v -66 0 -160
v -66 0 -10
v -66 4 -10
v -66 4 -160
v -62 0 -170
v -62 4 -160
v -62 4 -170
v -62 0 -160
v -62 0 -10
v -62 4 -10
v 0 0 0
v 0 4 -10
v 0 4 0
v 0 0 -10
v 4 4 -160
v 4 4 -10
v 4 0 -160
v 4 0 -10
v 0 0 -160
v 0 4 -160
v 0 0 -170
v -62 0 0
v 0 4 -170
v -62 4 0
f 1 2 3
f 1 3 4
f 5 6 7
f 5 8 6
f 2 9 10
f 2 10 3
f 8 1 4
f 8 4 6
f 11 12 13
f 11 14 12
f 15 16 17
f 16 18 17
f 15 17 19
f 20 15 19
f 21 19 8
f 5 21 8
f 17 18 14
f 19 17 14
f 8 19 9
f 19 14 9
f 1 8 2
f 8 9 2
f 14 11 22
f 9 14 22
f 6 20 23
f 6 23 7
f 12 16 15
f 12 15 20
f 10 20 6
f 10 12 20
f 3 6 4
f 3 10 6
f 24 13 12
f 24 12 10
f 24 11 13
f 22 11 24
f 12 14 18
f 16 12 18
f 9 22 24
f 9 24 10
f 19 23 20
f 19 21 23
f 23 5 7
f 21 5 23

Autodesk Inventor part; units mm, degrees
ref_plane "YZ Plane" through (0, 0, 0) normal (1, 0, 0) x (0, 1, 0)
ref_plane "XZ Plane" through (0, 0, 0) normal (0, 1, 0) x (-1, 0, 0)
ref_plane "XY Plane" through (0, 0, 0) normal (0, 0, 1) x (1, 0, 0)
sketch "スケッチ1" plane through (0, 0, 0) normal (0, 1, 0) x (-1, 0, 0)
  line L0 (0, 0) -> (62, 0)
  line L1 (62, 0) -> (62, -170)
  line L2 (62, -170) -> (0, -170)
  line L3 (0, -170) -> (0, 0)
  line L4 (62, -10) -> (66, -10)
  line L5 (66, -10) -> (66, -160)
  line L6 (66, -160) -> (62, -160)
  line L7 (62, -160) -> (62, -10)
  line L8 (0, -10) -> (-4, -10)
  line L9 (-4, -10) -> (-4, -160)
  line L10 (-4, -160) -> (0, -160)
  line L11 (0, -160) -> (0, -10)
  point P0 (0, -160)
  dimension "d0" = 62
  dimension "d1" = 170
  dimension "d2" = 4
  dimension "d3" = 150
  dimension "d4" = 4
  dimension "d5" = 150
  dimension "d6" = 10
  dimension "d7" = 10
extrude "押し出し1" add sketch "スケッチ1" along normal blind 4
properties part number "ER_lipo_sikiri_up" material "木材 (オーク)"
